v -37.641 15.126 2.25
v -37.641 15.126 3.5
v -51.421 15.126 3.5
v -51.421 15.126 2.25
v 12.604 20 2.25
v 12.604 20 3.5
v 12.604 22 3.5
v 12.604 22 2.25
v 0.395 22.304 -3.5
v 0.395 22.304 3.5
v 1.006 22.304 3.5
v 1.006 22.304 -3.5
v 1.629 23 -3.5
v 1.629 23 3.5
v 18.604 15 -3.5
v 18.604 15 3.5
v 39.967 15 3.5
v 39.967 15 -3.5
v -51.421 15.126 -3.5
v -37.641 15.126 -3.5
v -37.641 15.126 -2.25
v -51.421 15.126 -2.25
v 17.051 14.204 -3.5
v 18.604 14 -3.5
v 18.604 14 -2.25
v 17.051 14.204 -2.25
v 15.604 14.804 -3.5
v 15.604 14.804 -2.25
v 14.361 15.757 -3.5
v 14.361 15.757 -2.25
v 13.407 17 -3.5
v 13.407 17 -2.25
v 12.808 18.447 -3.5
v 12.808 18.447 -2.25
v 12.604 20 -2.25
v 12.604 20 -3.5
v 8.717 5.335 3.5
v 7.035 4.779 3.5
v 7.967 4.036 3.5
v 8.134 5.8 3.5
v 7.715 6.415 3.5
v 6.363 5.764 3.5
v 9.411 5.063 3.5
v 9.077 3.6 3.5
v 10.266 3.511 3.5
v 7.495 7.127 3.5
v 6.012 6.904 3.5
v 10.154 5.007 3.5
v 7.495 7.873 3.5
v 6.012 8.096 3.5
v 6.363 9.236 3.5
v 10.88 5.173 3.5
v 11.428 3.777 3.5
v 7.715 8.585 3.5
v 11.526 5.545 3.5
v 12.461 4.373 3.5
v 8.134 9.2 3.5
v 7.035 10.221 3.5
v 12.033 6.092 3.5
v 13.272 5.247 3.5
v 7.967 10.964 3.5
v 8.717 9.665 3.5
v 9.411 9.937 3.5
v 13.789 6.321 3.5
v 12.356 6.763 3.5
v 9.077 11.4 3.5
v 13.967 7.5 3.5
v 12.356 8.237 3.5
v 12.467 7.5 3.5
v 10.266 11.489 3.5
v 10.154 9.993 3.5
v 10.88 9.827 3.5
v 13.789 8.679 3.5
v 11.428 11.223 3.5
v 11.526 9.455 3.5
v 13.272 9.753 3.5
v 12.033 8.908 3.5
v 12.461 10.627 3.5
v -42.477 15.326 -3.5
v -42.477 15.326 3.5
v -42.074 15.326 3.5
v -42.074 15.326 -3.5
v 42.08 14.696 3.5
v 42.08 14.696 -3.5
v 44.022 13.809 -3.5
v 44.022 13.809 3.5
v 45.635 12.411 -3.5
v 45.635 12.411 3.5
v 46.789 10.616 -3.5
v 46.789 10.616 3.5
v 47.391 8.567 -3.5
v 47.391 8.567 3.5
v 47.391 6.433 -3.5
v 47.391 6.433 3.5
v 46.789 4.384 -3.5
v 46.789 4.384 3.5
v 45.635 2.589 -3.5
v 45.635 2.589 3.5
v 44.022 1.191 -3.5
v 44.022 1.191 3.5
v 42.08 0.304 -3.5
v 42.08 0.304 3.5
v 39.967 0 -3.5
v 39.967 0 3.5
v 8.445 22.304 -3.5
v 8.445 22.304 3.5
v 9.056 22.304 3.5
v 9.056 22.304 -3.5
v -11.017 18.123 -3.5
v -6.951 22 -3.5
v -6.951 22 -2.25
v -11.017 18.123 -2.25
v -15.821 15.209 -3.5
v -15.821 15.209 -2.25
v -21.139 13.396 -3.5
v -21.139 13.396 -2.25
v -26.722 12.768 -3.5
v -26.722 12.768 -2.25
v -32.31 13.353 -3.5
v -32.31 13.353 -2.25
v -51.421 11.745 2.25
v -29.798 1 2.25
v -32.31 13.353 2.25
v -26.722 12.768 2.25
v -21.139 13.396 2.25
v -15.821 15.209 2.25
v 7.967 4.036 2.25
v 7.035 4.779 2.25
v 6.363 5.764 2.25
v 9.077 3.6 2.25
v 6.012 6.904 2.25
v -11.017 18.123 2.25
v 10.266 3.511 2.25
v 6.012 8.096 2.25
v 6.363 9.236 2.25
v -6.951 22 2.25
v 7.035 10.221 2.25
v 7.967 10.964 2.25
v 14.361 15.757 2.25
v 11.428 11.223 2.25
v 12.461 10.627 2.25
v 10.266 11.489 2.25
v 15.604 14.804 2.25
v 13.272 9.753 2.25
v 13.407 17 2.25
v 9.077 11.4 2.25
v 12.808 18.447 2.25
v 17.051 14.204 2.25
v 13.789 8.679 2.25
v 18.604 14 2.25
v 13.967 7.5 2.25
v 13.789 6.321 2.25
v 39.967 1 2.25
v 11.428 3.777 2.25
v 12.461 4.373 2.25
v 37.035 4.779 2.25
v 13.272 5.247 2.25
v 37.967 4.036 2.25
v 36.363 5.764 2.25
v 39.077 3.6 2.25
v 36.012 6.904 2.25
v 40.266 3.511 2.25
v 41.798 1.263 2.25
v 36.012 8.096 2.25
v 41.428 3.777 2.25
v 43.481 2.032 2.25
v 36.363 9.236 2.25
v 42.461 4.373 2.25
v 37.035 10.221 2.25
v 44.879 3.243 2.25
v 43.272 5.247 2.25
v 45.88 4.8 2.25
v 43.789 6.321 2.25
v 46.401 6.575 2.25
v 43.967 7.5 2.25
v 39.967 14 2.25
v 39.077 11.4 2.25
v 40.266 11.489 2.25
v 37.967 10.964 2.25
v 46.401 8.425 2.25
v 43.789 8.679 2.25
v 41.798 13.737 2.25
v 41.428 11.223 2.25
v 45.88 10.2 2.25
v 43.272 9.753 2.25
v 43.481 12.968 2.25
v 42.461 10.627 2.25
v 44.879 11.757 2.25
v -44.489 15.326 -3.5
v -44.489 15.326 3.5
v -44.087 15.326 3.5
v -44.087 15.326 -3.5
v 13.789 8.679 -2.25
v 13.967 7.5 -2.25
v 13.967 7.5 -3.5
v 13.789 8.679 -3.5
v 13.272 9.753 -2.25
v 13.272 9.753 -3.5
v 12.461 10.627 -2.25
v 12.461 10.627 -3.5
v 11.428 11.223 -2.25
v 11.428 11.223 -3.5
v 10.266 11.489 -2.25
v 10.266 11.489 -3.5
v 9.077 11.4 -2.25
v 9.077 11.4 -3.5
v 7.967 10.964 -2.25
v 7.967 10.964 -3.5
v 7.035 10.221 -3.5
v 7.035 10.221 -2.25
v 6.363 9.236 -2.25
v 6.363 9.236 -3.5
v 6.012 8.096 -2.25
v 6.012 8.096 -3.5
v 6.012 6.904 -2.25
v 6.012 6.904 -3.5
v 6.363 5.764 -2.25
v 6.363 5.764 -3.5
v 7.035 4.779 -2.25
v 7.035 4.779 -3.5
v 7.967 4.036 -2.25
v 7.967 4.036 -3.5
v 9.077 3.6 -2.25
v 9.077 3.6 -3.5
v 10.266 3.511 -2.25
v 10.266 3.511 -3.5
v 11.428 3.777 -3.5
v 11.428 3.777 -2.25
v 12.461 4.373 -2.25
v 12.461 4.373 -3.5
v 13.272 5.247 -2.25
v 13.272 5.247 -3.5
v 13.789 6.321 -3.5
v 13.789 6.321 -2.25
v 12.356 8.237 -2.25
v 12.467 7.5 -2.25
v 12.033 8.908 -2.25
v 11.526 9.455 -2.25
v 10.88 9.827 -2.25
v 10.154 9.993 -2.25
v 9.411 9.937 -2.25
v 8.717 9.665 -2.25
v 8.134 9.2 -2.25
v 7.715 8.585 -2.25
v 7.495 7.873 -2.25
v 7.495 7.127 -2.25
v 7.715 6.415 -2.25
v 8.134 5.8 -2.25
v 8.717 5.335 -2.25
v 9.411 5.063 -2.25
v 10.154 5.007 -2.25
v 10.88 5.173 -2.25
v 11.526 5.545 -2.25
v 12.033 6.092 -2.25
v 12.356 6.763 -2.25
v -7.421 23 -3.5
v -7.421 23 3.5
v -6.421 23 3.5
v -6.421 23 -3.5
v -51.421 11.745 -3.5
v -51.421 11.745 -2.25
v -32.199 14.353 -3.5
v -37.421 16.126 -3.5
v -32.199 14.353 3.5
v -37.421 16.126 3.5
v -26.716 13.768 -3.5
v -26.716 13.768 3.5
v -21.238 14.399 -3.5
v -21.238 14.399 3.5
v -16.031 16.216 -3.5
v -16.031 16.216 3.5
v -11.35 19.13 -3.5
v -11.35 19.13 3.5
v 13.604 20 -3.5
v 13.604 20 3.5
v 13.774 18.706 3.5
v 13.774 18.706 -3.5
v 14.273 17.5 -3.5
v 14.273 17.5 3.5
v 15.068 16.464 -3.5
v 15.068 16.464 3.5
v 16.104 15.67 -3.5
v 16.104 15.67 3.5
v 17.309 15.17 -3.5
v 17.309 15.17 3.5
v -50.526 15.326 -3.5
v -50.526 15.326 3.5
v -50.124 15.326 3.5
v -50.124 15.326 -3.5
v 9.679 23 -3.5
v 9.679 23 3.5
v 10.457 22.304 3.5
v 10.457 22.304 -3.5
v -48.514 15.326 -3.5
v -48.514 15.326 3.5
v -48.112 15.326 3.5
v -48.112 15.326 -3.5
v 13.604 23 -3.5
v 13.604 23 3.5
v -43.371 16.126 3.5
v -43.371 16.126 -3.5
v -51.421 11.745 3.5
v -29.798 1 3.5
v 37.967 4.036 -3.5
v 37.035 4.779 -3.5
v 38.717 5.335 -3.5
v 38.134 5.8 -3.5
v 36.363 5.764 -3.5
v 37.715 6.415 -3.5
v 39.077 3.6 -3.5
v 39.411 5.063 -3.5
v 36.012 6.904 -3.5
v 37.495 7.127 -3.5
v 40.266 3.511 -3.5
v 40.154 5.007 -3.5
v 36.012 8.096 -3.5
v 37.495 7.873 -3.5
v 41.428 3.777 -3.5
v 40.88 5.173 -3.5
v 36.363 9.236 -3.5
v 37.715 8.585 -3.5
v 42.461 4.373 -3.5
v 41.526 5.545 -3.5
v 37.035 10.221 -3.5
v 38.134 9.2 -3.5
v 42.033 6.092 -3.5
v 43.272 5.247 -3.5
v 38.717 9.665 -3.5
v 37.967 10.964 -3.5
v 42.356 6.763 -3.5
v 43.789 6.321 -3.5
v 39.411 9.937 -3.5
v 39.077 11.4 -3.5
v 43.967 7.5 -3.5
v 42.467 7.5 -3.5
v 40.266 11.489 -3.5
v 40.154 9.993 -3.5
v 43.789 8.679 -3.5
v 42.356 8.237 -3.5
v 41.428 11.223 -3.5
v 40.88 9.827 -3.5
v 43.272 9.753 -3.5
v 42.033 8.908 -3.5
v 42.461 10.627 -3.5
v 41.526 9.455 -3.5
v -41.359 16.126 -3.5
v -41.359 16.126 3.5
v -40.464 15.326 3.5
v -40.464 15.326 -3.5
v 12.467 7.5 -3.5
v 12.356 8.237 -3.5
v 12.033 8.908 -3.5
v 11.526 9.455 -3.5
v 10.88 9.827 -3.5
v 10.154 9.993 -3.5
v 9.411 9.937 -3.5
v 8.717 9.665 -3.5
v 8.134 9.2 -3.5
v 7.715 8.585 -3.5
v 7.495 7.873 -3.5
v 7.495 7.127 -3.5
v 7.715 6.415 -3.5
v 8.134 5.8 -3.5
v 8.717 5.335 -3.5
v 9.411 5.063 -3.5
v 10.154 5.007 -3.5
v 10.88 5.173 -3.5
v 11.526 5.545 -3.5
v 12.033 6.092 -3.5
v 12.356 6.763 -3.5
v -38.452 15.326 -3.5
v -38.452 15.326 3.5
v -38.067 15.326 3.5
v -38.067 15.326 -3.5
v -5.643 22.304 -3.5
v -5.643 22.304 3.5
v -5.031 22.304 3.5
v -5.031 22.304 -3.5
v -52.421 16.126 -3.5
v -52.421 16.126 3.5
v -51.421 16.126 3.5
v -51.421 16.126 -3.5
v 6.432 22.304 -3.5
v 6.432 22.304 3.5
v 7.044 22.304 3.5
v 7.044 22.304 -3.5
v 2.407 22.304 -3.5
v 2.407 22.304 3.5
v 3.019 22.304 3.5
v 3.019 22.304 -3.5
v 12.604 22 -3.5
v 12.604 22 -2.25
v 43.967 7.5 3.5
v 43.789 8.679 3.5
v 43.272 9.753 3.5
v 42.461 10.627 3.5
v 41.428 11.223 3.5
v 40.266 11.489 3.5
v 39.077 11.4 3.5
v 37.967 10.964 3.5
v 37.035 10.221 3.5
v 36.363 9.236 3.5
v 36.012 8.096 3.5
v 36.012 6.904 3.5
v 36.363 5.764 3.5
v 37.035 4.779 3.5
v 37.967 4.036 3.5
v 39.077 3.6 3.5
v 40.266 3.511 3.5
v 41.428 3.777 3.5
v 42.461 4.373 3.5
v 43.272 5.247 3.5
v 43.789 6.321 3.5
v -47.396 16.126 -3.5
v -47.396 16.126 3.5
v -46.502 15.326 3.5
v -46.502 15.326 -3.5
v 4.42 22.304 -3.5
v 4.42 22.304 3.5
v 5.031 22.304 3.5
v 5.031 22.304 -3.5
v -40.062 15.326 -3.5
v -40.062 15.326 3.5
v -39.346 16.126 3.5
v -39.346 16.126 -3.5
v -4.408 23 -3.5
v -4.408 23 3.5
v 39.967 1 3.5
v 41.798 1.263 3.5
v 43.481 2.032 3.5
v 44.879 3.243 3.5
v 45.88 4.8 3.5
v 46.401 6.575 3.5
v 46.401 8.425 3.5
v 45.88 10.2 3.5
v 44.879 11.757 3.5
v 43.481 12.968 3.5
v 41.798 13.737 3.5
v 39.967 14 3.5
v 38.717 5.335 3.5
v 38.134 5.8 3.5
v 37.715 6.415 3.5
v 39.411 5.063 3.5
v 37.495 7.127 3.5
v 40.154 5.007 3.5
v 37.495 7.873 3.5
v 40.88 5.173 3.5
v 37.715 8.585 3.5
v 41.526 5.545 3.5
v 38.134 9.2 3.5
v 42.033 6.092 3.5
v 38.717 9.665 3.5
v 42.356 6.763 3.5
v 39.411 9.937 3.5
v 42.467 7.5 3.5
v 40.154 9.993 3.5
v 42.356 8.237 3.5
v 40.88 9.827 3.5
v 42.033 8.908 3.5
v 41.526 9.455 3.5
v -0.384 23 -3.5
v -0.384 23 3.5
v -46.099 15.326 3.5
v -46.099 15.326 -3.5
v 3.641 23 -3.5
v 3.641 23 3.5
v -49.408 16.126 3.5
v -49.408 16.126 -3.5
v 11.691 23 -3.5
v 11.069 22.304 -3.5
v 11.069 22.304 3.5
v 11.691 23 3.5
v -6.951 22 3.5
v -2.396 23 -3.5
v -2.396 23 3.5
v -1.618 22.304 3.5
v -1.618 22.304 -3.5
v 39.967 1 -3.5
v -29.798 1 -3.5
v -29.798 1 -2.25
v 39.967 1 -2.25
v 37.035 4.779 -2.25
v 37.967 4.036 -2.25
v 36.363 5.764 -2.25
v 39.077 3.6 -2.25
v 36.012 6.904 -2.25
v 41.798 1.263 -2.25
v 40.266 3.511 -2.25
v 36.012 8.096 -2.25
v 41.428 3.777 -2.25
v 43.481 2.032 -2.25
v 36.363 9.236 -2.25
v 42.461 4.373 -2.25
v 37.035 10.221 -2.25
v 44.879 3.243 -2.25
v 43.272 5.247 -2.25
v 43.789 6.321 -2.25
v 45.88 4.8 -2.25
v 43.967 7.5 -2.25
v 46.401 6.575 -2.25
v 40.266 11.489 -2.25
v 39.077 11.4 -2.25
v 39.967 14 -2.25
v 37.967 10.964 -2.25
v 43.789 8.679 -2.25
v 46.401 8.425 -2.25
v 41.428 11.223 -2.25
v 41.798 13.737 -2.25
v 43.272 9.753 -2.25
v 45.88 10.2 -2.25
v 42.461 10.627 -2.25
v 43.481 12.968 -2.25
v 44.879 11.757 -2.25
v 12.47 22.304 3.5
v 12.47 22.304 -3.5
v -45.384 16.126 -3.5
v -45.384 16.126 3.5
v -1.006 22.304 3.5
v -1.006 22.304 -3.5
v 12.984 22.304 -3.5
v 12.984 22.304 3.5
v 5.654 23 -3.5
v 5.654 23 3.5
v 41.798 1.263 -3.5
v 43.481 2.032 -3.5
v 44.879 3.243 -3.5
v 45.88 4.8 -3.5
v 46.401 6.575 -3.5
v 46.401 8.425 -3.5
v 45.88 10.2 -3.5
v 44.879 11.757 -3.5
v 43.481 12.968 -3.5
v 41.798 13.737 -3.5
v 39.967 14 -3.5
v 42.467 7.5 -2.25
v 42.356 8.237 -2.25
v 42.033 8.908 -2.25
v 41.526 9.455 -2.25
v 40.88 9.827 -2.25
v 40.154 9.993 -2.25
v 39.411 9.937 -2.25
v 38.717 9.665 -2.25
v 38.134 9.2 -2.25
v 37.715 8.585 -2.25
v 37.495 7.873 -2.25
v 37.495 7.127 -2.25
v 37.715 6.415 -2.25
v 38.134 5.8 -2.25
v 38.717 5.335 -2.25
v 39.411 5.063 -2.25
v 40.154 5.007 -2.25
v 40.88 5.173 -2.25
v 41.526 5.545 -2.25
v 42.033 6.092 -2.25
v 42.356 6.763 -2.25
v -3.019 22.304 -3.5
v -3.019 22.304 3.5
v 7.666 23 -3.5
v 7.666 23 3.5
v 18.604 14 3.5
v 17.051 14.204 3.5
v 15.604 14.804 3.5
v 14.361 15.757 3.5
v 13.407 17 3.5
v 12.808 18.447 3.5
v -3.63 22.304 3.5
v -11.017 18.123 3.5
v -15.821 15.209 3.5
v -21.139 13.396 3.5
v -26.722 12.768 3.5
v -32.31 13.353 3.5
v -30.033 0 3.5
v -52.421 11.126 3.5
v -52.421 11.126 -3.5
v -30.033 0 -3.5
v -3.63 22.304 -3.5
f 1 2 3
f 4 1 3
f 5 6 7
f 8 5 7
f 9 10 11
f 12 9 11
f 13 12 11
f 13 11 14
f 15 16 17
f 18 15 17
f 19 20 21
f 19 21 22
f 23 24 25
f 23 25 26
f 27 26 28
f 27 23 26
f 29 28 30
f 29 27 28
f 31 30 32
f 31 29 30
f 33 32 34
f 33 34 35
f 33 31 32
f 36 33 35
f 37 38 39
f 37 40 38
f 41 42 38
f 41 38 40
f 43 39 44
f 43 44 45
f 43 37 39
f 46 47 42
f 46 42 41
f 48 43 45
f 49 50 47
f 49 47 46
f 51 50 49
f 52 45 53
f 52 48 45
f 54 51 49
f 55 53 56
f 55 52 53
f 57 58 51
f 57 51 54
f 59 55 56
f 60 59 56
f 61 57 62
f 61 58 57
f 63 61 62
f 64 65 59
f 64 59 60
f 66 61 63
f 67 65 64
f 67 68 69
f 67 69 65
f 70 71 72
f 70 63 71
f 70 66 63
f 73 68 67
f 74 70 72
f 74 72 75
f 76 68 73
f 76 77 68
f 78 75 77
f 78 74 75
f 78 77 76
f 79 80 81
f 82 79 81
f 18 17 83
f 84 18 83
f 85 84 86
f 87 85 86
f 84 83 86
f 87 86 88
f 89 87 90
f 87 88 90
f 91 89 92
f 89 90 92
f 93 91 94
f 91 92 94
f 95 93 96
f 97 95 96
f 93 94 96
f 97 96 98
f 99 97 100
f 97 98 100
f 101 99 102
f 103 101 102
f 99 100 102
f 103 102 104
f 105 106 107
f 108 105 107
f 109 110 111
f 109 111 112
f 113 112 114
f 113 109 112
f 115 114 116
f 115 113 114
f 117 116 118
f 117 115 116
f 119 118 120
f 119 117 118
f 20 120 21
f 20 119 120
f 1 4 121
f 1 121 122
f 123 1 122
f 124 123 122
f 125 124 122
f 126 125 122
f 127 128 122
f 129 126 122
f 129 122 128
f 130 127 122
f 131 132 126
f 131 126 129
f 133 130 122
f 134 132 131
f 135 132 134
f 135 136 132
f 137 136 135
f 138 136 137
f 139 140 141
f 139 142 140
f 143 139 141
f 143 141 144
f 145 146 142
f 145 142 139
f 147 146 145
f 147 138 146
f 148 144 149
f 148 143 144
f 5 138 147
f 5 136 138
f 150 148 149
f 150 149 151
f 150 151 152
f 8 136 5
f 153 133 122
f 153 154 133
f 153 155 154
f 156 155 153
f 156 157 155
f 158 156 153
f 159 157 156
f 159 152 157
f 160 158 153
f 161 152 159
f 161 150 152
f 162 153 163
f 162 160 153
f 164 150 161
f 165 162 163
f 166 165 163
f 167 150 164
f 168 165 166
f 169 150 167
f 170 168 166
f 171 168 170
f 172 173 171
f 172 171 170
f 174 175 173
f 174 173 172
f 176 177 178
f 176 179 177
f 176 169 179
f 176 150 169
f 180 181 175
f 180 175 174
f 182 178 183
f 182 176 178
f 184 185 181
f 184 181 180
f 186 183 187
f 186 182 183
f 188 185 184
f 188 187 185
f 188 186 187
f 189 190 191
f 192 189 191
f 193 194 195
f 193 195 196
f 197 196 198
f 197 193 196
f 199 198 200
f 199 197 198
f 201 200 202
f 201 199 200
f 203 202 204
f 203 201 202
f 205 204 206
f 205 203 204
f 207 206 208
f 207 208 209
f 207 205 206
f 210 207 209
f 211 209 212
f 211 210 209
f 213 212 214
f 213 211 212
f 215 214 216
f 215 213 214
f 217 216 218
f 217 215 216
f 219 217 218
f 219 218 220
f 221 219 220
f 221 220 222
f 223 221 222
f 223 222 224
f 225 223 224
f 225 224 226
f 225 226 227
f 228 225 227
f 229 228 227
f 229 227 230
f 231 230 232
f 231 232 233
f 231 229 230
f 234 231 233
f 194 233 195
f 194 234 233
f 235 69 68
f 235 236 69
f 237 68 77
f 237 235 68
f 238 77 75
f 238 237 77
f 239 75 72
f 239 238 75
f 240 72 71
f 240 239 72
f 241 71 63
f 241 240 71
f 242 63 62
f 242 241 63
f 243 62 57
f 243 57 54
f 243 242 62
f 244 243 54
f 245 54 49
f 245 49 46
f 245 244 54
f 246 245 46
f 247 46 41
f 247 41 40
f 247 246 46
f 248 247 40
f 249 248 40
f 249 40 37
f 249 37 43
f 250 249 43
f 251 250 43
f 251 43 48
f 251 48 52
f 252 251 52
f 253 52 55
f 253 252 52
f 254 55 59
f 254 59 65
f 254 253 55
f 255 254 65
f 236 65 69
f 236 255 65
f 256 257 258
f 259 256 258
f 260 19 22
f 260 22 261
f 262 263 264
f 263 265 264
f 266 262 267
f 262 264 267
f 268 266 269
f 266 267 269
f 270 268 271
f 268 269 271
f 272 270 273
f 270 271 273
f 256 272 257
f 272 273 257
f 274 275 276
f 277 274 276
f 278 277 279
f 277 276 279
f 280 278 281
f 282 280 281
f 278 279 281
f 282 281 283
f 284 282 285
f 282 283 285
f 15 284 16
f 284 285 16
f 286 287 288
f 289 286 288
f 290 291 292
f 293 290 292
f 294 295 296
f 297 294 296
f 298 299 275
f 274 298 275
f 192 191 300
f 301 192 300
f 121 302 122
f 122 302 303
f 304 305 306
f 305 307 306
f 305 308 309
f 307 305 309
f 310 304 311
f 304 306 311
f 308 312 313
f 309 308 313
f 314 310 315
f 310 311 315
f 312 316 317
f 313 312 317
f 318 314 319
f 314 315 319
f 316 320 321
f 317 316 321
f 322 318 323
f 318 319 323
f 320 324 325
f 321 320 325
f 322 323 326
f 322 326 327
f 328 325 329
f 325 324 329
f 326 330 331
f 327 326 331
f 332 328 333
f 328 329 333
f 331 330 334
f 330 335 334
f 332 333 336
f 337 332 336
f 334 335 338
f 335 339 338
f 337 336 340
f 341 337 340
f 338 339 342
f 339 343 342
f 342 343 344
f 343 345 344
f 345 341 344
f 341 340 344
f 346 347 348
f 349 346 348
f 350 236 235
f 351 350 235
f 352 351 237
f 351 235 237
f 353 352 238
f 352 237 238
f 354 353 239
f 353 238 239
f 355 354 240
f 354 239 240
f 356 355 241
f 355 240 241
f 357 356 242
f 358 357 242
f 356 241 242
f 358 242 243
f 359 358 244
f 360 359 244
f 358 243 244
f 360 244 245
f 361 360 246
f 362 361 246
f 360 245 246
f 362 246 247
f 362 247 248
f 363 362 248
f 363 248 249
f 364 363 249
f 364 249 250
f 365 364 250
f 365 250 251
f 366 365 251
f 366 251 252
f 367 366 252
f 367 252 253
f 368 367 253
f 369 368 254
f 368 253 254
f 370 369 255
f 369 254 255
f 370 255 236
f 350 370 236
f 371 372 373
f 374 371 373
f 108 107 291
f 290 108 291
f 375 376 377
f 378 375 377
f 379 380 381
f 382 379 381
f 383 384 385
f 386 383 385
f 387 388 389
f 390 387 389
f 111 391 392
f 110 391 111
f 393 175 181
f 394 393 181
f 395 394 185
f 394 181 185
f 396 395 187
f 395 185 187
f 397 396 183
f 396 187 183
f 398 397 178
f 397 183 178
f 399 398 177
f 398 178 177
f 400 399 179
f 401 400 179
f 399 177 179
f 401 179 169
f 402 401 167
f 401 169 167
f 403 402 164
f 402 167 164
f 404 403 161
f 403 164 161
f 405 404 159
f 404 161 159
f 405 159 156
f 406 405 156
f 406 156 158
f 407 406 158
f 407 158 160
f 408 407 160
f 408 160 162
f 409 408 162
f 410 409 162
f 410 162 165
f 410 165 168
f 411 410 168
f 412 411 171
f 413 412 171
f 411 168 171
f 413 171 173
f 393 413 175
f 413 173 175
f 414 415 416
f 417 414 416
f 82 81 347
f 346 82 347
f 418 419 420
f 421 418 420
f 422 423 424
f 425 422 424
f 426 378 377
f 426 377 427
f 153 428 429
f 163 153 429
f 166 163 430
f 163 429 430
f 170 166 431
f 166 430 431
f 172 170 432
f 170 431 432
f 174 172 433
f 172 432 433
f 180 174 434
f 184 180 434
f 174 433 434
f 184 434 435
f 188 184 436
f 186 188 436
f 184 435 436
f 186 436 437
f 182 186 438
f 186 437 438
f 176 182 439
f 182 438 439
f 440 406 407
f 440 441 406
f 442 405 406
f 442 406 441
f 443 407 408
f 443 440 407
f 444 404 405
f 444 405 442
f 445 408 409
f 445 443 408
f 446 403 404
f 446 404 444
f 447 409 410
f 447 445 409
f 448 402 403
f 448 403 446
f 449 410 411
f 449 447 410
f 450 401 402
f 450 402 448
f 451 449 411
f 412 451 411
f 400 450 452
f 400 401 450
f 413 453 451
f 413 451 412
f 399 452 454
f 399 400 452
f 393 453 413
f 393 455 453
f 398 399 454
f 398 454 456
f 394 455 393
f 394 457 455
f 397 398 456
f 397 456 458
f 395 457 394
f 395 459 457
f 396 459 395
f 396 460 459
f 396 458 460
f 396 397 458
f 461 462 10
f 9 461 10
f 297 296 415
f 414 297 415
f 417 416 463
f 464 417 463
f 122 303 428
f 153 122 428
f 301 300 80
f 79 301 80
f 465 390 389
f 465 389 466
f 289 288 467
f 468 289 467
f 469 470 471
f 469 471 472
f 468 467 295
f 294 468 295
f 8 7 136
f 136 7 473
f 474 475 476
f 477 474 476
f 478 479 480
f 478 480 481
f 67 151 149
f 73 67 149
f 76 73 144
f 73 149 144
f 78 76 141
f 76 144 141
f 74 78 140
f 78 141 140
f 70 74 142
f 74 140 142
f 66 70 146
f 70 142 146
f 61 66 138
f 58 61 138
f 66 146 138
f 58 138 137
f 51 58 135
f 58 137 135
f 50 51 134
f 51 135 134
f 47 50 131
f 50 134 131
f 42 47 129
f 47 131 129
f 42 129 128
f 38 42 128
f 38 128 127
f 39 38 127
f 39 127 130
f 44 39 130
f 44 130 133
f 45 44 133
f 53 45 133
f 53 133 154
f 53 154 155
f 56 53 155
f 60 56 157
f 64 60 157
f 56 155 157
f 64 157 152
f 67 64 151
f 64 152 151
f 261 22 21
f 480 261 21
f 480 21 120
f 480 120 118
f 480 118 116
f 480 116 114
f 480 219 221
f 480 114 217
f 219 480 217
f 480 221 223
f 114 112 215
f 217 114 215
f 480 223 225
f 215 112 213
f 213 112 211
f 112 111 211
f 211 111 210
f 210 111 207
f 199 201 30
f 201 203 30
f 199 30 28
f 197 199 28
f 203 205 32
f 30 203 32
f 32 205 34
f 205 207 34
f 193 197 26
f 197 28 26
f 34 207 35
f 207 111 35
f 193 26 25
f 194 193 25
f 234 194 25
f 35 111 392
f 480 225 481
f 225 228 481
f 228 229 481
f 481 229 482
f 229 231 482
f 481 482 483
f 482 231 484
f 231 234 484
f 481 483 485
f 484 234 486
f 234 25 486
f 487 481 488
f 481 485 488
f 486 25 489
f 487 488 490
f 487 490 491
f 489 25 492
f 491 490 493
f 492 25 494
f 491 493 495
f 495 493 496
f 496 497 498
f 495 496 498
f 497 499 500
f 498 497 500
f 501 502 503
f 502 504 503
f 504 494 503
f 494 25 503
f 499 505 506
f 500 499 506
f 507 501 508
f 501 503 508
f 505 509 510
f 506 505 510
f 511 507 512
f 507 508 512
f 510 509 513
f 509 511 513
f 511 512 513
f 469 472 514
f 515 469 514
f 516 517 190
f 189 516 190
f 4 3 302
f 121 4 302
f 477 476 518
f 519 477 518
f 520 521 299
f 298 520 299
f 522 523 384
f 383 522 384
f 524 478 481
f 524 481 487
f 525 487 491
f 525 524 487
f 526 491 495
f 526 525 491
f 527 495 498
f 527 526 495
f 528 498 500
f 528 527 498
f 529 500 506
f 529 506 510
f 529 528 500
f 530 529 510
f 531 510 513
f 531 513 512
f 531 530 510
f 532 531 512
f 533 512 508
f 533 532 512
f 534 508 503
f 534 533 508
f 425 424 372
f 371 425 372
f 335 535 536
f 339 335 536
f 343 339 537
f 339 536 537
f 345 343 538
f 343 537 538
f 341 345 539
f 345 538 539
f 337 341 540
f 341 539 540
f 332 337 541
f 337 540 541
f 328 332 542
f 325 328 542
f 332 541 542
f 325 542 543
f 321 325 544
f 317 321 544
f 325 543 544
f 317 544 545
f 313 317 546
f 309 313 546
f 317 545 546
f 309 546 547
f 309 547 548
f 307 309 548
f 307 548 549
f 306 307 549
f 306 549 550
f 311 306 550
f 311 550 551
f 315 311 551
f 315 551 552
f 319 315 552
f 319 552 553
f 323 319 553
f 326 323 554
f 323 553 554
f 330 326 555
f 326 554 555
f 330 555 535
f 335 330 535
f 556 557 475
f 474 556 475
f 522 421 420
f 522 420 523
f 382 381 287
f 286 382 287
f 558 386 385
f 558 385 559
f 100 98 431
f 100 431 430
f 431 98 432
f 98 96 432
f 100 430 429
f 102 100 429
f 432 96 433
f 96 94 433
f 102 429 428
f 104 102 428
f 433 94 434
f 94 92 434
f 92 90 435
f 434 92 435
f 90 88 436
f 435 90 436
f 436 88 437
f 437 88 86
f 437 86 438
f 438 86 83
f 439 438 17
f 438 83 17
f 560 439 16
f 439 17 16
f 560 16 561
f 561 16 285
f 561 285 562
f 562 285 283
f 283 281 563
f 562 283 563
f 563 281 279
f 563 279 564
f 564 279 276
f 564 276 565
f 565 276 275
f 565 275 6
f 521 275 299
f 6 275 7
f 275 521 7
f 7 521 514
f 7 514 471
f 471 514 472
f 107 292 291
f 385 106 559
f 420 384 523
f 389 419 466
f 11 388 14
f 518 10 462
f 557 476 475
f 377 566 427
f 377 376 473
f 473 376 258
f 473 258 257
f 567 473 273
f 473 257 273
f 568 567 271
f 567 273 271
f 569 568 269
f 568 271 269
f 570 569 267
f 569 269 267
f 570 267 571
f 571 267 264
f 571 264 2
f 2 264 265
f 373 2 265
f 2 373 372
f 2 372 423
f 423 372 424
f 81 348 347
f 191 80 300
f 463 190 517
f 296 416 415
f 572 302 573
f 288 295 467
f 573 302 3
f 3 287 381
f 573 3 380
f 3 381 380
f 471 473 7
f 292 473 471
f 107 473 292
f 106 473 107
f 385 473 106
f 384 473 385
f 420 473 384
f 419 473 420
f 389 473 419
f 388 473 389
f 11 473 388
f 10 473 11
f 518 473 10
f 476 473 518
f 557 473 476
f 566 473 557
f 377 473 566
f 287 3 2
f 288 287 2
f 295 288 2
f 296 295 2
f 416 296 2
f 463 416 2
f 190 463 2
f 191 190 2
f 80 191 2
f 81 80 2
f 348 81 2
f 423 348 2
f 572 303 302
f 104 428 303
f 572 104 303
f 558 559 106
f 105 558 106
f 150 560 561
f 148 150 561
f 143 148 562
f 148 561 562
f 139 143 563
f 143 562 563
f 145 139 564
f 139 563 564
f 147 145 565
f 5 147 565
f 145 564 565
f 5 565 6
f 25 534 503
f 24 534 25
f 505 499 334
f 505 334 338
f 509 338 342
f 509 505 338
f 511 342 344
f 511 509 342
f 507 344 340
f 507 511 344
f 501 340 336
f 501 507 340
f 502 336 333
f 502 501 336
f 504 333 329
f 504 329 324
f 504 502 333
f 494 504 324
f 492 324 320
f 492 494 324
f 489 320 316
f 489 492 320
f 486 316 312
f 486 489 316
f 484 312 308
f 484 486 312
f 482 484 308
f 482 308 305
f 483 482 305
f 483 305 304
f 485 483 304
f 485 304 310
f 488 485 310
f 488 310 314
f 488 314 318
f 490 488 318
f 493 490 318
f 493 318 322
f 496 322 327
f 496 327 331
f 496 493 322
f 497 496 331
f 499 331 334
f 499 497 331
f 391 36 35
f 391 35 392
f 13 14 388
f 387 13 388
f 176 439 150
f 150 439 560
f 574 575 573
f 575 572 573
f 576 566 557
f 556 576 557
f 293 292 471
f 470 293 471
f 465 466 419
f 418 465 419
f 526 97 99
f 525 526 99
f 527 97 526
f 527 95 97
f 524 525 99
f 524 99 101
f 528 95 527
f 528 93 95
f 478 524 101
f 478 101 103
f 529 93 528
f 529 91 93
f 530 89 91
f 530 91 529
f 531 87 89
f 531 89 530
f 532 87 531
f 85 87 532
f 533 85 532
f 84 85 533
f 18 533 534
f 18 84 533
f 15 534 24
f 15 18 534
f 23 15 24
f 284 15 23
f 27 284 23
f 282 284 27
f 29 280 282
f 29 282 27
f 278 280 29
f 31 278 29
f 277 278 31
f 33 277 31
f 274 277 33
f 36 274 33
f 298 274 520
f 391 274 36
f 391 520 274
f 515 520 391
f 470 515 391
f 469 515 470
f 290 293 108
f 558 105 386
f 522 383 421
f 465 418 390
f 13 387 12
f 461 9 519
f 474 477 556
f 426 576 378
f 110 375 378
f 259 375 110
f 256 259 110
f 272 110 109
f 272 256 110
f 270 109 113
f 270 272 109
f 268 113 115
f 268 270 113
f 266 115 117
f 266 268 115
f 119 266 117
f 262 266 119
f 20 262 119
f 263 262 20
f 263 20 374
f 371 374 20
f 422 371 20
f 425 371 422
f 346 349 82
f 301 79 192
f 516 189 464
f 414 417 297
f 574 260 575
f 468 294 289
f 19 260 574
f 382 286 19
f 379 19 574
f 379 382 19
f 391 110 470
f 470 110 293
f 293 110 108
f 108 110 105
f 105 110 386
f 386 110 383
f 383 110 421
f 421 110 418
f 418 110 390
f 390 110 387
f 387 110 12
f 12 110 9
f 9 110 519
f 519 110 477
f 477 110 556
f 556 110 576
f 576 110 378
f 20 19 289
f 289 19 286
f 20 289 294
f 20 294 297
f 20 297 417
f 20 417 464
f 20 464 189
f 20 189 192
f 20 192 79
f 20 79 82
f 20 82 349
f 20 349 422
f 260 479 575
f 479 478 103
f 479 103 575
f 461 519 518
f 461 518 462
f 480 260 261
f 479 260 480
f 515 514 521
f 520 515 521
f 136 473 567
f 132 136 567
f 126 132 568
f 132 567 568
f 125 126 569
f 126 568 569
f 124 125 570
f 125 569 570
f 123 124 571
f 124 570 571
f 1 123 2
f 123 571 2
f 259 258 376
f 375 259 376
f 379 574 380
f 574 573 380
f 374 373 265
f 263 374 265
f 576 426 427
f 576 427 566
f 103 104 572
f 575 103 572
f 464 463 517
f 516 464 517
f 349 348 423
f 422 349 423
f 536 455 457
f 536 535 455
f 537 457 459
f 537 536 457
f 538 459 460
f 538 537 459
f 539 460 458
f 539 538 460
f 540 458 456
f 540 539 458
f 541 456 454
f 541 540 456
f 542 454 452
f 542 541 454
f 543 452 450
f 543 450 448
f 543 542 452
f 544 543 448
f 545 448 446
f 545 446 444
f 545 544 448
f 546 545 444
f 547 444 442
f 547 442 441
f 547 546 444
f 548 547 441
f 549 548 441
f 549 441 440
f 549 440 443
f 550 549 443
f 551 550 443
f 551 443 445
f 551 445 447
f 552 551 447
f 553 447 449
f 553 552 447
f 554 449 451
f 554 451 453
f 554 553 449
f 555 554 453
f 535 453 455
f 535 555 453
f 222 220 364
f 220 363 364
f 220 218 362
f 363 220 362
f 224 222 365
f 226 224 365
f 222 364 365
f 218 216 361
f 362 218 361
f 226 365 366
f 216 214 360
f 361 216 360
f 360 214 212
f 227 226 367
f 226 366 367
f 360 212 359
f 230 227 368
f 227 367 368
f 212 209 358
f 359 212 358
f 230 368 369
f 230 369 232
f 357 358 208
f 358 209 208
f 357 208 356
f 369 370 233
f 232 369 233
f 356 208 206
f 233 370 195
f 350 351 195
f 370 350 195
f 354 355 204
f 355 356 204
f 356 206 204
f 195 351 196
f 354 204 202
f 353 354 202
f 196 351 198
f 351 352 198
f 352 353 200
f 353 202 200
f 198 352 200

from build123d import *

# Parameters (mm, degrees)
SKETCH1_R           = 2.5
BOSS_EXTRUDE1_DEPTH = 3.5
CUT_EXTRUDE1_DEPTH  = 1.25
SKETCH3_R           = 4
SKETCH3_R_2         = 2.5
BOSS_EXTRUDE4_DEPTH = 1.25
CUT_EXTRUDE2_DEPTH  = 58.671073524
CUT_EXTRUDE3_DEPTH  = 58.671073524


with BuildPart() as part:
    # Sketch1 → Boss-Extrude1 (new, symmetric)
    with BuildSketch(Plane.XY):
        with BuildLine():
            Line((39.9669967, 0), (-30.0330033, 0))
            Line((-30.0330033, 0), (-52.420918739, 11.12570188))
            Line((-52.420918739, 11.12570188), (-52.420918739, 16.12570188))
            Line((-52.420918739, 16.12570188), (-37.420918739, 16.12570188))
            ThreePointArc((-37.420918739, 16.12570188), (-21.237684162, 14.399118341), (-7.420918739, 23))
            Line((-7.420918739, 23), (13.603539052, 23))
            Line((13.603539052, 23), (13.603539052, 20))
            ThreePointArc((13.603539052, 20), (15.068005146, 16.464466094), (18.603539052, 15))
            Line((18.603539052, 15), (39.9669967, 15))
            ThreePointArc((39.9669967, 15), (47.4669967, 7.5), (39.9669967, 0))
        make_face()
        with Locations((39.9669967, 7.5)):
            Circle(SKETCH1_R, mode=Mode.SUBTRACT)
        with Locations((9.9669967, 7.5)):
            Circle(SKETCH1_R, mode=Mode.SUBTRACT)
    extrude(amount=BOSS_EXTRUDE1_DEPTH, both=True)

    # Sketch2 → Cut-Extrude1 (cut)
    with BuildSketch(Plane.XY.offset(3.5)):
        with BuildLine():
            Line((39.9669967, 14), (18.603539052, 14))
            ThreePointArc((18.603539052, 14), (14.360898365, 15.757359313), (12.603539052, 20))
            Line((12.603539052, 20), (12.603539052, 22))
            Line((12.603539052, 22), (-6.950732305, 22))
            ThreePointArc((-6.950732305, 22), (-21.138653729, 13.396213633), (-37.641111866, 15.12570188))
            Line((-37.641111866, 15.12570188), (-51.420918739, 15.12570188))
            Line((-51.420918739, 15.12570188), (-51.420918739, 11.745424522))
            Line((-51.420918739, 11.745424522), (-29.798223995, 1))
            Line((-29.798223995, 1), (39.9669967, 1))
            ThreePointArc((39.9669967, 1), (46.4669967, 7.5), (39.9669967, 14))
        make_face()
    cut_extrude1 = extrude(amount=-CUT_EXTRUDE1_DEPTH, mode=Mode.SUBTRACT)

    # Sketch3 → Boss-Extrude4 (add)
    # profile 1 of 2: a face of its own
    with BuildSketch(Plane.XY.offset(2.25)):
        with Locations((9.9669967, 7.5)):
            Circle(SKETCH3_R)
        with Locations((9.9669967, 7.5)):
            Circle(SKETCH3_R_2, mode=Mode.SUBTRACT)
    # profile 2 of 2: a face of its own
    with BuildSketch(Plane.XY.offset(2.25)):
        with Locations((39.9669967, 7.5)):
            Circle(SKETCH3_R)
        with Locations((39.9669967, 7.5)):
            Circle(SKETCH3_R_2, mode=Mode.SUBTRACT)
    boss_extrude4 = extrude(amount=BOSS_EXTRUDE4_DEPTH)

    # Mirror1: Cut-Extrude1, Boss-Extrude4 across plane
    add(cut_extrude1.mirror(Plane.XY), mode=Mode.SUBTRACT)
    add(boss_extrude4.mirror(Plane.XY))

    # Sketch4 → Cut-Extrude2 (cut, through all)
    with BuildSketch(Plane.XY.offset(3.5)):
        Polygon((-43.37107402, 16.12570188), (-45.3835352, 16.12570188), (-44.489108009, 15.32570188), (-44.086615773, 15.32570188), align=None)
        Polygon((-41.35861284, 16.12570188), (-43.37107402, 16.12570188), (-42.476646829, 15.32570188), (-42.074154593, 15.32570188), align=None)
        Polygon((-39.34615166, 16.12570188), (-41.35861284, 16.12570188), (-40.464185649, 15.32570188), (-40.061693413, 15.32570188), align=None)
        Polygon((-37.420918739, 16.12570188), (-39.34615166, 16.12570188), (-38.451724469, 15.32570188), (-38.066677885, 15.32570188), align=None)
        Polygon((-45.3835352, 16.12570188), (-47.395996379, 16.12570188), (-46.501569188, 15.32570188), (-46.099076953, 15.32570188), align=None)
        Polygon((-47.395996379, 16.12570188), (-49.408457559, 16.12570188), (-48.514030368, 15.32570188), (-48.111538132, 15.32570188), align=None)
        Polygon((-49.408457559, 16.12570188), (-51.420918739, 16.12570188), (-50.526491548, 15.32570188), (-50.123999312, 15.32570188), align=None)
    extrude(amount=-CUT_EXTRUDE2_DEPTH, mode=Mode.SUBTRACT)

    # Sketch5 → Cut-Extrude3 (cut, through all)
    with BuildSketch(Plane.XY.offset(3.5)):
        Polygon((-4.408457559, 23), (-6.420918739, 23), (-5.642537797, 22.30379492), (-5.031162313, 22.30379492), align=None)
        Polygon((-2.395996379, 23), (-4.408457559, 23), (-3.630076617, 22.30379492), (-3.018701133, 22.30379492), align=None)
        Polygon((-0.3835352, 23), (-2.395996379, 23), (-1.617615437, 22.30379492), (-1.006239954, 22.30379492), align=None)
        Polygon((1.62892598, 23), (-0.3835352, 23), (0.394845743, 22.30379492), (1.006221226, 22.30379492), align=None)
        Polygon((3.64138716, 23), (1.62892598, 23), (2.407306922, 22.30379492), (3.018682406, 22.30379492), align=None)
        Polygon((5.65384834, 23), (3.64138716, 23), (4.419768102, 22.30379492), (5.031143586, 22.30379492), align=None)
        Polygon((7.666309519, 23), (5.65384834, 23), (6.432229282, 22.30379492), (7.043604765, 22.30379492), align=None)
        Polygon((9.678770699, 23), (7.666309519, 23), (8.444690462, 22.30379492), (9.056065945, 22.30379492), align=None)
        Polygon((11.691231879, 23), (9.678770699, 23), (10.457151641, 22.30379492), (11.068527125, 22.30379492), align=None)
        Polygon((13.603539052, 23), (11.691231879, 23), (12.469612821, 22.30379492), (12.984312686, 22.30379492), align=None)
    extrude(amount=-CUT_EXTRUDE3_DEPTH, mode=Mode.SUBTRACT)


solid = part.part
